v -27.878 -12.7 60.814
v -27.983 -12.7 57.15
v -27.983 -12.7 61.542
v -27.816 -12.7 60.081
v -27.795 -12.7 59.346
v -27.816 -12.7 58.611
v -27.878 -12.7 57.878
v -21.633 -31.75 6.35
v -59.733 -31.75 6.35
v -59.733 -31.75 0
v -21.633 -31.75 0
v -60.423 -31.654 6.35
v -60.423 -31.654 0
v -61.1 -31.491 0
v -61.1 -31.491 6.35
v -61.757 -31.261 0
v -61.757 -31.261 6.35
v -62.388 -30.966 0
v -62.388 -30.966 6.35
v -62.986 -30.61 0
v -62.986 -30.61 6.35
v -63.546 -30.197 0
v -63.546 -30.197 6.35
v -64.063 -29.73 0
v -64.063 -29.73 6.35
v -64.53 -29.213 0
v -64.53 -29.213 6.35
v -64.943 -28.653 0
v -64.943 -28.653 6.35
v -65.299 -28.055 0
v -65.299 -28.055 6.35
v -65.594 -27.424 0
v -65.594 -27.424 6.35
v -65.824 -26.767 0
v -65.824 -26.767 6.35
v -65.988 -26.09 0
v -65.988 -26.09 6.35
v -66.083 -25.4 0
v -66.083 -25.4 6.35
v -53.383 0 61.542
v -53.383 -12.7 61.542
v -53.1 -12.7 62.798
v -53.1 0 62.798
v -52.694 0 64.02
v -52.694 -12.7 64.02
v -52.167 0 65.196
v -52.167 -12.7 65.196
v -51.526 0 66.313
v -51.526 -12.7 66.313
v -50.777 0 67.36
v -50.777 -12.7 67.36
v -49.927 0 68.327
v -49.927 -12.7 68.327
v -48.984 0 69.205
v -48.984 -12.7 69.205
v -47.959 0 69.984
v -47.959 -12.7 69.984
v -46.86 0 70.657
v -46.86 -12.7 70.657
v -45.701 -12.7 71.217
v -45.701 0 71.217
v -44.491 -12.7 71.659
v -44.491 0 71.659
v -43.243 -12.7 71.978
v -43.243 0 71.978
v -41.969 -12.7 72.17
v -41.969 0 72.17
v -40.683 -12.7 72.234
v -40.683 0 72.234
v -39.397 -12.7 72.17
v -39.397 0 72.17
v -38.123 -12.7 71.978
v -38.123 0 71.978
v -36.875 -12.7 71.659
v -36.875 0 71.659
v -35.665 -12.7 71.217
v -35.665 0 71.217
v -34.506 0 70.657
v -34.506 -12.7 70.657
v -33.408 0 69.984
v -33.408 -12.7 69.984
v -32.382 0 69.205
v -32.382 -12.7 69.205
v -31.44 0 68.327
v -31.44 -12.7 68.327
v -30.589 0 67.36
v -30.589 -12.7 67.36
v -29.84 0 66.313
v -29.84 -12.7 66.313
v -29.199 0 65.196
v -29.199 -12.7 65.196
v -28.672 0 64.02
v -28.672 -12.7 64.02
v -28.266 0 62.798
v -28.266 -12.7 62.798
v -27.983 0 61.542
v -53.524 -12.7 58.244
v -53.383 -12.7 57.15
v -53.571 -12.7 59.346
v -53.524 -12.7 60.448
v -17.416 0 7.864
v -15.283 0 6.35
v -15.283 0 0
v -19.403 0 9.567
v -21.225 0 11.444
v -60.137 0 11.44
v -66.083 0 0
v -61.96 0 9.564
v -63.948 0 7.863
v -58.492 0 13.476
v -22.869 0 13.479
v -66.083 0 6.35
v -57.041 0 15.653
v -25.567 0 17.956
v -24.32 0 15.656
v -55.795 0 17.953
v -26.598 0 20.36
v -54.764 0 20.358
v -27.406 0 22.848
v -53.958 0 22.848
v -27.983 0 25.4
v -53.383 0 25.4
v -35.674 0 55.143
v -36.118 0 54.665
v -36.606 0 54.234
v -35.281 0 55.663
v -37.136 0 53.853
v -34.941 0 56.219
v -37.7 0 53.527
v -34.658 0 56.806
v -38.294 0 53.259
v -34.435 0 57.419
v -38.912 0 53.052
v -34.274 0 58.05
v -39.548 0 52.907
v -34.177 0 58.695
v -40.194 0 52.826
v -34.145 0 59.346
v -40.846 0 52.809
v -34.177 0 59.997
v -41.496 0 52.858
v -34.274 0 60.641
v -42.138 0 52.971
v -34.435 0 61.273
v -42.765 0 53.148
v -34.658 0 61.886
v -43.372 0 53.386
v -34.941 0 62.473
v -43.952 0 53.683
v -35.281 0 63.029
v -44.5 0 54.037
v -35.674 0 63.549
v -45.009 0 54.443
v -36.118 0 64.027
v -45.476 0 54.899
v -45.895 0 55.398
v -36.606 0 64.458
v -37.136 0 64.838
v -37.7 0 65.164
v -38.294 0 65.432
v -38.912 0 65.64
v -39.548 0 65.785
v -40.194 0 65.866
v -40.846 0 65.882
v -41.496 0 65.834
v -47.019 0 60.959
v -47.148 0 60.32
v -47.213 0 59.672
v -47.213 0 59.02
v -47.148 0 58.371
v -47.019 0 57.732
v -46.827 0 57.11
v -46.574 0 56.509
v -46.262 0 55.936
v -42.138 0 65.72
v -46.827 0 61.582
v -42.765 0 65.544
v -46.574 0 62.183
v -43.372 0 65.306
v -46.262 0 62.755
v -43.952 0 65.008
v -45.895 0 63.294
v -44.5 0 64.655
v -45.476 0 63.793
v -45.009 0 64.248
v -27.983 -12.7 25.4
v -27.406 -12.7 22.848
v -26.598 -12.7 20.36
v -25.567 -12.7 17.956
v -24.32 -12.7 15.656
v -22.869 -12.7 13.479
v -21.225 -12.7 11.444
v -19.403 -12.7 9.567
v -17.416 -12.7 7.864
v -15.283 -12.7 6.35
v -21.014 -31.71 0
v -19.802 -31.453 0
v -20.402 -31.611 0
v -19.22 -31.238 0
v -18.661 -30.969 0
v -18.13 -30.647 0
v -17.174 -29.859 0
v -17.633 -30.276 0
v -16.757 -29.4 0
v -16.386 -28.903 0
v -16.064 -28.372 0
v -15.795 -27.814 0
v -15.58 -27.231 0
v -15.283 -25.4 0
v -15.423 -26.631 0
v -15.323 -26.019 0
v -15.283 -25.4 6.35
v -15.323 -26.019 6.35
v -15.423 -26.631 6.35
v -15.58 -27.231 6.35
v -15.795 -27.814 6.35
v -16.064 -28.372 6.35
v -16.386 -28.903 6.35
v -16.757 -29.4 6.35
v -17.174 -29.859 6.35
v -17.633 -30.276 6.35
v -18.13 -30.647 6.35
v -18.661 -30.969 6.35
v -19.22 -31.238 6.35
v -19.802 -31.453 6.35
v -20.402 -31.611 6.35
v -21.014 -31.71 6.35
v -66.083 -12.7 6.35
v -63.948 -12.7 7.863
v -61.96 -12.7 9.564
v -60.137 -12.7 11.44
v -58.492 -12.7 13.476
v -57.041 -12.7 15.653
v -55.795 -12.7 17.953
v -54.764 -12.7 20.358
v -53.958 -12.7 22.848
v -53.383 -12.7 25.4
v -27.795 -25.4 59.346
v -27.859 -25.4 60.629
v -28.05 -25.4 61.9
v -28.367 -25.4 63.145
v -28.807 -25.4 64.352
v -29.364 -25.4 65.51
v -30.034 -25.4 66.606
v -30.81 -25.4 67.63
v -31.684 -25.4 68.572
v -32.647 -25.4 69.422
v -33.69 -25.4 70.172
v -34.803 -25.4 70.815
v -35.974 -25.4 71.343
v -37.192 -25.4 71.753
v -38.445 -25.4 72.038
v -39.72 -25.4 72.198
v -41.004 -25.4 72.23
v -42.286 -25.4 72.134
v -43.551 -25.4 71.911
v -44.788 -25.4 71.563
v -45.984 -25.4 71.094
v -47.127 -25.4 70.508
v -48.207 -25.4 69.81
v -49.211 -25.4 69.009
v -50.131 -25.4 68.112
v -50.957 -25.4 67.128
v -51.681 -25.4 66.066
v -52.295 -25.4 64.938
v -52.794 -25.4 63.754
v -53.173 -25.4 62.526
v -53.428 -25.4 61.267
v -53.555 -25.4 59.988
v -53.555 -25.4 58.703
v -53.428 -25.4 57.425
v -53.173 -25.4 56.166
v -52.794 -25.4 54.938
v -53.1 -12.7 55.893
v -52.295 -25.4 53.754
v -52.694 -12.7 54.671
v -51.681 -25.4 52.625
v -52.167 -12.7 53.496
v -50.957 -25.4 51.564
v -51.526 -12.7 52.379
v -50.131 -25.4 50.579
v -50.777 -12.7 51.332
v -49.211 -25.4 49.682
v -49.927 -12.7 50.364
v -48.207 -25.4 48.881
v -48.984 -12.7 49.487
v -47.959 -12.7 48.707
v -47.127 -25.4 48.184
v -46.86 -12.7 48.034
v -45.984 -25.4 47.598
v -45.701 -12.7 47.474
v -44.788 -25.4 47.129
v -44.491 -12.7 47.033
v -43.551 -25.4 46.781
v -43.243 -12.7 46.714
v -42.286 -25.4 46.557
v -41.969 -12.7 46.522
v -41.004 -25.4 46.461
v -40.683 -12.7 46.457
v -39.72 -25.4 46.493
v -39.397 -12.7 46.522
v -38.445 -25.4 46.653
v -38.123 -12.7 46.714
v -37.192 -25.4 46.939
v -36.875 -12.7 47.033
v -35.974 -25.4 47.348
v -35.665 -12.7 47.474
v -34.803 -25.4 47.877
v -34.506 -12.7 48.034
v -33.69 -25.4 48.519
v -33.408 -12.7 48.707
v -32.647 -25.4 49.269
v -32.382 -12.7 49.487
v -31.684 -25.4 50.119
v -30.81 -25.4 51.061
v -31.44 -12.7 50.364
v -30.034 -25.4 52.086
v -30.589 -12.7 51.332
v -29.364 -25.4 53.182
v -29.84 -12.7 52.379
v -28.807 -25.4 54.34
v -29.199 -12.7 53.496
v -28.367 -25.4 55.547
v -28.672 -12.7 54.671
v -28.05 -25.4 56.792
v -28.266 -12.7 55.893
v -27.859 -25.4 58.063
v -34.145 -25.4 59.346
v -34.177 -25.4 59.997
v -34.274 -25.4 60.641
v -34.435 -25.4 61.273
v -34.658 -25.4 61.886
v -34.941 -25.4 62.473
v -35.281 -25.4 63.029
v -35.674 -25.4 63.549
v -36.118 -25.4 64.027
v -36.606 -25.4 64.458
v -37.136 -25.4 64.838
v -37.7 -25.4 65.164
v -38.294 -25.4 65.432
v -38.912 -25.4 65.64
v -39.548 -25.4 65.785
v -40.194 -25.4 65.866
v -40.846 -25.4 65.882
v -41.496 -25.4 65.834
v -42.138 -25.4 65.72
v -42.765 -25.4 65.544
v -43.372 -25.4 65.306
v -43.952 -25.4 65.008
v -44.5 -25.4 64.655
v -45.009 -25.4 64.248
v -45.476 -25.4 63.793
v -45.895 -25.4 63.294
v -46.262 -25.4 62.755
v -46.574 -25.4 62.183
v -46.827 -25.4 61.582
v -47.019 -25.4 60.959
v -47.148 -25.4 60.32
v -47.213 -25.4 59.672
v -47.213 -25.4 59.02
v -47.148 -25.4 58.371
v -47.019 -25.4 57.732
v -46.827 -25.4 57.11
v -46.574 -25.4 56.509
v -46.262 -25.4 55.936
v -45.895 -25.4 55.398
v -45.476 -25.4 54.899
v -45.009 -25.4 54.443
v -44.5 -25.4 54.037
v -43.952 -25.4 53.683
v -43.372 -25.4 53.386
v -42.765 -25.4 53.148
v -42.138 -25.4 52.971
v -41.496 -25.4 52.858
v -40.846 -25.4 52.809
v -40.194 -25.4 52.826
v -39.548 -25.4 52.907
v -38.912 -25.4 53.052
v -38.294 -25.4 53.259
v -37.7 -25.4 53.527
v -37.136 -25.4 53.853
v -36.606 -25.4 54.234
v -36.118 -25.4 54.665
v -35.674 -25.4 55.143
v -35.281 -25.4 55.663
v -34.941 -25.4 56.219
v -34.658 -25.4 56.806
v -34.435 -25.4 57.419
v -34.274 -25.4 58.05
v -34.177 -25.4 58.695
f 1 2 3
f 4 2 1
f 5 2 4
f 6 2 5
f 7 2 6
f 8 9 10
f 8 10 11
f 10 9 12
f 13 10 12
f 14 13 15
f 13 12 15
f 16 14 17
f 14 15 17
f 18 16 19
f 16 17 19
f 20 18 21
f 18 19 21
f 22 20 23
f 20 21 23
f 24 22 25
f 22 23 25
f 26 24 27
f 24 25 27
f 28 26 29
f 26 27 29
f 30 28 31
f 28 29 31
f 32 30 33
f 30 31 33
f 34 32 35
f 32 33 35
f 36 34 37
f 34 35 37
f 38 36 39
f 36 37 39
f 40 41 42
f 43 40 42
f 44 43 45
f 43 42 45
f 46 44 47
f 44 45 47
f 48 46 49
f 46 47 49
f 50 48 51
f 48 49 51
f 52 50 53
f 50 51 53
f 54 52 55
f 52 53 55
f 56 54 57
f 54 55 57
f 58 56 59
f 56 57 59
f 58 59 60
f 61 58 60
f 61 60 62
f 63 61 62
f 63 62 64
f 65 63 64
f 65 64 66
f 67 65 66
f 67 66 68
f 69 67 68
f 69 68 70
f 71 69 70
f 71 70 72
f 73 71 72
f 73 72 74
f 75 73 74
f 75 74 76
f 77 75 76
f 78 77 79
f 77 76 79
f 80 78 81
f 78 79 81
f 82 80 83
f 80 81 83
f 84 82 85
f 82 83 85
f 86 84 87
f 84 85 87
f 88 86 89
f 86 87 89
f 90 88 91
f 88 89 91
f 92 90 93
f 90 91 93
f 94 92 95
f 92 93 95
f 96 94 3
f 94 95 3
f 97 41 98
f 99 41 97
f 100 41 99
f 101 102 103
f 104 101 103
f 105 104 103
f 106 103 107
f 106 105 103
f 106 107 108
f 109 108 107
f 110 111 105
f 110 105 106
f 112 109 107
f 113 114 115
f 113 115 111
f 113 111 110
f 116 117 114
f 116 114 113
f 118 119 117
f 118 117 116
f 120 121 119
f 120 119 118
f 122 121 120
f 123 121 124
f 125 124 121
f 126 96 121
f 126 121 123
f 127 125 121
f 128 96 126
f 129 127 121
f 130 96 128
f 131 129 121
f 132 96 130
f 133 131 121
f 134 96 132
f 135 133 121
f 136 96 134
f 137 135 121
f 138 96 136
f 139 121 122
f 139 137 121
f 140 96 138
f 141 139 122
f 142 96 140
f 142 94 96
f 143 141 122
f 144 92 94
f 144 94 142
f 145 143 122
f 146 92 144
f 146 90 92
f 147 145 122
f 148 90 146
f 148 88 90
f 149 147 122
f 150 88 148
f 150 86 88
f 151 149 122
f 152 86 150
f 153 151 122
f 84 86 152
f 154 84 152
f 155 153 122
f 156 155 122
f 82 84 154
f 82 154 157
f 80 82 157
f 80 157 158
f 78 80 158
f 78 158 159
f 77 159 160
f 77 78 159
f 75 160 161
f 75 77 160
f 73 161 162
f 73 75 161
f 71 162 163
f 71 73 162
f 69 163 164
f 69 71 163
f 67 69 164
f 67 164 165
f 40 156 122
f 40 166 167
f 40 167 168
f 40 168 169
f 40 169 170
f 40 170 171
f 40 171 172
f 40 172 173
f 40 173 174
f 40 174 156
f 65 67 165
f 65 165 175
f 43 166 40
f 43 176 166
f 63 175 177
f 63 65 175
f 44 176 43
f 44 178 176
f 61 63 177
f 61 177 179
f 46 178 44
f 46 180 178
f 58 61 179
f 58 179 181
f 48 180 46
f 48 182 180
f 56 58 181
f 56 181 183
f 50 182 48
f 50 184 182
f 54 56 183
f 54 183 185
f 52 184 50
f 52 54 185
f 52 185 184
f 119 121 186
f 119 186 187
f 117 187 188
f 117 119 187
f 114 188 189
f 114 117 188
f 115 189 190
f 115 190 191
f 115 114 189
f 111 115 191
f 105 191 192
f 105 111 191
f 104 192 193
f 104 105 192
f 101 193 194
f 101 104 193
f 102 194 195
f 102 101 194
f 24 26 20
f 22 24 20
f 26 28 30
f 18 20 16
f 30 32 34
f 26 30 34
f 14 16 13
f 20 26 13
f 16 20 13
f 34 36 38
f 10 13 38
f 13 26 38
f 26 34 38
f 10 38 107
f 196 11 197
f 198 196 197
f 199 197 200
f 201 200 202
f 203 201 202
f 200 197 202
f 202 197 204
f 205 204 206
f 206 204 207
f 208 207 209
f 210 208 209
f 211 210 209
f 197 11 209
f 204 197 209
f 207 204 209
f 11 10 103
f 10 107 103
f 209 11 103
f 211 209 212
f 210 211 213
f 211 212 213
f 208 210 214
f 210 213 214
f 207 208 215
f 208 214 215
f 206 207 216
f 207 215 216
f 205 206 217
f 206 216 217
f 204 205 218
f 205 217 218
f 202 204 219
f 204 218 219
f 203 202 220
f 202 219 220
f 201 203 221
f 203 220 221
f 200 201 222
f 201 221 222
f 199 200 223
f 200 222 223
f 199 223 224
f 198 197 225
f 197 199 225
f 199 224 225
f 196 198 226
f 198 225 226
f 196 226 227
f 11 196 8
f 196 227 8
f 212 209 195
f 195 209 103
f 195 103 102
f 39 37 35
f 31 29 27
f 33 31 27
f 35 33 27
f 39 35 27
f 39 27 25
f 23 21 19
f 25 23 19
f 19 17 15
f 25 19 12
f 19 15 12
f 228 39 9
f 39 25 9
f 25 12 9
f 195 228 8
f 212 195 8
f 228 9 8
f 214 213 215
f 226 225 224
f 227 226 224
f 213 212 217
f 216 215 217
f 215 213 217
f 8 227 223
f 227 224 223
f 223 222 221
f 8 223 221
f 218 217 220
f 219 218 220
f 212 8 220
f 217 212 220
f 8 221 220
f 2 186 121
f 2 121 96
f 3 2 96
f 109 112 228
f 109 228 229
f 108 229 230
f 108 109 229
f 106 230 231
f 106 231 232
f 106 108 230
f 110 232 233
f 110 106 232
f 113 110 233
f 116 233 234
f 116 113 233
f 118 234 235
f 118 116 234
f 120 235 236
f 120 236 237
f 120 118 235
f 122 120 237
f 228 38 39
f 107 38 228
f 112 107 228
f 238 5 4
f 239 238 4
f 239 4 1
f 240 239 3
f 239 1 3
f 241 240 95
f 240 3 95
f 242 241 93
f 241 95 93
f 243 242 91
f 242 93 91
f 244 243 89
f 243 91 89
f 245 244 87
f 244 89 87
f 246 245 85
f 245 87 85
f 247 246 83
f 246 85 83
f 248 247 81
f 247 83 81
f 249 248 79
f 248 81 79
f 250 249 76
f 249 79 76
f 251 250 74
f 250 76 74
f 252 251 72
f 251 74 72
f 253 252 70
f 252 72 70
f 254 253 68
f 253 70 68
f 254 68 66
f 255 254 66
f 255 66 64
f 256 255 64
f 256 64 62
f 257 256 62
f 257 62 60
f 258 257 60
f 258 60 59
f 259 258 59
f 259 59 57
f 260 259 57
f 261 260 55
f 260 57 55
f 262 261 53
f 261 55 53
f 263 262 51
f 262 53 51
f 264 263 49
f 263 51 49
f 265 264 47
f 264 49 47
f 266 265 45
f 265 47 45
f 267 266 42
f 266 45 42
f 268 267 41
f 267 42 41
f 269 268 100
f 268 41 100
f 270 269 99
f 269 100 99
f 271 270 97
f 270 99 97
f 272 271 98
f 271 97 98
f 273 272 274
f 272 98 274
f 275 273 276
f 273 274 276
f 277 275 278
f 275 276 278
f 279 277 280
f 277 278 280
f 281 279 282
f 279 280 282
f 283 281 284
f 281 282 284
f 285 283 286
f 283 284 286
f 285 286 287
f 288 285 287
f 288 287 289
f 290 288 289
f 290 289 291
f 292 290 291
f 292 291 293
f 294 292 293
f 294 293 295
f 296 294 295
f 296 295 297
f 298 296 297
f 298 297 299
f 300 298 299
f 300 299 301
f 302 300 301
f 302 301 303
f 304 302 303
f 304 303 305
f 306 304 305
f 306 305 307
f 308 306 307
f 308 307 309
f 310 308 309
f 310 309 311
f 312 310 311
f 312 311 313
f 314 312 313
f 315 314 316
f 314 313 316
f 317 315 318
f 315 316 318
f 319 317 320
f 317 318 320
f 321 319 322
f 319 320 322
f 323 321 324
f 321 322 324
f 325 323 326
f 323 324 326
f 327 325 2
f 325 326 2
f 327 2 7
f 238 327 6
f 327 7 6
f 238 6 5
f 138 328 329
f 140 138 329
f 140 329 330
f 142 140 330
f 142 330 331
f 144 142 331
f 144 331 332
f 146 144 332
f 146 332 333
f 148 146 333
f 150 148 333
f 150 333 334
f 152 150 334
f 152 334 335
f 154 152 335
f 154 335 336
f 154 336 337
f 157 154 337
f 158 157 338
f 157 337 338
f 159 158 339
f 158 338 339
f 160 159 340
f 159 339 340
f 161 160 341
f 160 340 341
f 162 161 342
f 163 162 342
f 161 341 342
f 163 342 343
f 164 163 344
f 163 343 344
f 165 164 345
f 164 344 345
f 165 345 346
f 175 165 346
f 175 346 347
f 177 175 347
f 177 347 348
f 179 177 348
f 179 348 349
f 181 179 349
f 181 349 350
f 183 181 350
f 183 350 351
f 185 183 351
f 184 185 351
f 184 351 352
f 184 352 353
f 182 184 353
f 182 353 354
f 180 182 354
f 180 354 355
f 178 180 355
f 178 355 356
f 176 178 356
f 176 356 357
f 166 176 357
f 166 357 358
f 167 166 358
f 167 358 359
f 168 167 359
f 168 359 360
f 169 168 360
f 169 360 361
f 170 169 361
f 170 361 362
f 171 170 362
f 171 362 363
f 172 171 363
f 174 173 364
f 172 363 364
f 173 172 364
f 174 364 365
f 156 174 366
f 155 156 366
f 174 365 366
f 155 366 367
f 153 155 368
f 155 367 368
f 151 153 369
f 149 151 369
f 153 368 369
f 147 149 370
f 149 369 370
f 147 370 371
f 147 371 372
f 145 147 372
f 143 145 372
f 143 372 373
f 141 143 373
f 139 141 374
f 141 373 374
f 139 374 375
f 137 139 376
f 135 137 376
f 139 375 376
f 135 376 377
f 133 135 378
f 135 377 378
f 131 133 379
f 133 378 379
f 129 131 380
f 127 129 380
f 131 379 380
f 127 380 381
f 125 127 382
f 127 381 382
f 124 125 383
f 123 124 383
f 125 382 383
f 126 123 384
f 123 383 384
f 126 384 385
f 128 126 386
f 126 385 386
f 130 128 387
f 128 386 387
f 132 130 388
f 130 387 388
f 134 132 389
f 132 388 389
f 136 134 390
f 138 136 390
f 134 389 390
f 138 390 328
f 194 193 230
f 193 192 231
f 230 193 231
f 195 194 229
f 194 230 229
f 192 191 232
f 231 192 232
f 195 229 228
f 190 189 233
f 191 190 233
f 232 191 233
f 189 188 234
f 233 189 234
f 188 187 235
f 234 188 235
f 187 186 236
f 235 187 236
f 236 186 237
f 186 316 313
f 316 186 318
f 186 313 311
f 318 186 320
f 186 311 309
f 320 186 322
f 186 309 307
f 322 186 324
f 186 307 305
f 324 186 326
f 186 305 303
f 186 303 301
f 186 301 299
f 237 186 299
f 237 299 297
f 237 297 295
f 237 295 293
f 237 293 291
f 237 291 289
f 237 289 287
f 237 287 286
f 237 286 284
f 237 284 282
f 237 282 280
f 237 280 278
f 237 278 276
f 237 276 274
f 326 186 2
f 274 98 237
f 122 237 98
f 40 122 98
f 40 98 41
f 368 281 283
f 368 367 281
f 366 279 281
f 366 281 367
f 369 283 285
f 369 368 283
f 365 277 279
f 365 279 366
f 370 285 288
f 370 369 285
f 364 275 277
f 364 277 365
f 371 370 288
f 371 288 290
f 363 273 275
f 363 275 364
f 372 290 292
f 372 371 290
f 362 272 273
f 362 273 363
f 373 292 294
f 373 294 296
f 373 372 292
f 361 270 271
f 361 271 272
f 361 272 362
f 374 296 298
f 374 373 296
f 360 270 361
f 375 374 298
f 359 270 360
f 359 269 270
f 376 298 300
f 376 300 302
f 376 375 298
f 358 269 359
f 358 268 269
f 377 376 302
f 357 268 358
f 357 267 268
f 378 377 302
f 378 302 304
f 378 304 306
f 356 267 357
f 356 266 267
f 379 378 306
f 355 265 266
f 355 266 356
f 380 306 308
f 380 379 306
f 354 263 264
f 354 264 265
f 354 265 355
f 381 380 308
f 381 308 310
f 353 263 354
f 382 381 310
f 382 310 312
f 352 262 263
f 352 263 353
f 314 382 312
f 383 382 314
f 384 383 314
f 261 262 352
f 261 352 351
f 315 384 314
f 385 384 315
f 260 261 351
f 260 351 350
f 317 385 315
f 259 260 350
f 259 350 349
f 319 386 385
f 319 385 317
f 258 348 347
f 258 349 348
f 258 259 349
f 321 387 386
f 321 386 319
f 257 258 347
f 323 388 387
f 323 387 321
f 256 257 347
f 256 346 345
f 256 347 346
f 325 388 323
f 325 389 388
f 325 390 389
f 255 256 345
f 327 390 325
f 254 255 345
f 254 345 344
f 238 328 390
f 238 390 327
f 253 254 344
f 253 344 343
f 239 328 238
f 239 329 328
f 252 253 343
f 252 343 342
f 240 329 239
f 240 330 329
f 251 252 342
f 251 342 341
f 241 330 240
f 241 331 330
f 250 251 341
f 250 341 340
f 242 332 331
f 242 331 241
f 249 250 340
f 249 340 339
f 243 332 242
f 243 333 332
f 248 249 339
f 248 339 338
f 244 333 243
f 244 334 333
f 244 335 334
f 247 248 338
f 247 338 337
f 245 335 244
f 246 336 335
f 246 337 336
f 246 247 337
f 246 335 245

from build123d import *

# Parameters (mm, degrees)
F0_W      = 50.8
F0_H      = 6.35
F1_DEPTH  = 31.75
F2_W      = 50.8
F2_H      = 69.85
F3_DEPTH  = 12.7
F4_W      = 12.7
F4_H      = 69.85
F5_DEPTH  = 25.4
F7_DEPTH  = 12.7
F9_DEPTH  = 12.701
F10_R     = 12.888436
F11_DEPTH = 12.7
F12_R     = 6.538436
F13_DEPTH = 25.401
F15_DEPTH = 25.4
F17_DEPTH = 25.4


with BuildPart() as f1:
    # F0 (on Front) → F1 (new body)
    with BuildSketch(Plane.XZ):
        with Locations((-40.683051, 3.175)):
            Rectangle(F0_W, F0_H)
    extrude(amount=F1_DEPTH)

    # F2 (on face) → F3 (join)
    with BuildSketch(Plane(origin=(0, 0, 0), x_dir=(-1, 0, 0), z_dir=(0, 1, 0))):
        with Locations((40.683051, 41.275)):
            Rectangle(F2_W, F2_H)
    extrude(amount=-F3_DEPTH)

    # F4 (on face) → F5 (cut)
    with BuildSketch(Plane.XZ.offset(12.7)):
        with Locations((-59.733051, 41.275)):
            Rectangle(F4_W, F4_H)
        with Locations((-21.633051, 41.275)):
            Rectangle(F4_W, F4_H)
    extrude(amount=-F5_DEPTH, mode=Mode.SUBTRACT)

    # F6 (on face) → F7 (join)
    with BuildSketch(Plane(origin=(0, 0, 0), x_dir=(-1, 0, 0), z_dir=(0, 1, 0))):
        with BuildLine():
            ThreePointArc((27.983051, 25.4), (23.619413, 14.550759), (15.283051, 6.35))
            Line((15.283051, 6.35), (27.983051, 6.35))
            Line((27.983051, 6.35), (27.983051, 25.4))
        make_face()
        with BuildLine():
            Line((53.383051, 6.35), (66.083051, 6.35))
            ThreePointArc((66.083051, 6.35), (57.741785, 14.547489), (53.383051, 25.4))
            Line((53.383051, 25.4), (53.383051, 6.35))
        make_face()
    extrude(amount=-F7_DEPTH)

    # F8 (on face) → F9 (cut, through all)
    with BuildSketch(Plane.XZ.offset(12.7)):
        with BuildLine():
            ThreePointArc((-53.383051, 61.541711), (-40.683051, 72.234292), (-27.983051, 61.541711))
            Line((-27.983051, 61.541711), (-27.983051, 76.2))
            Line((-27.983051, 76.2), (-53.383051, 76.2))
            Line((-53.383051, 76.2), (-53.383051, 61.541711))
        make_face()
    extrude(amount=-F9_DEPTH, mode=Mode.SUBTRACT)

    # F10 (on face) → F11 (join)
    with BuildSketch(Plane.XZ.offset(12.7)):
        with Locations((-40.683051, 59.345856)):
            Circle(F10_R)
    extrude(amount=F11_DEPTH)

    # F12 (on face) → F13 (cut, through all)
    with BuildSketch(Plane.XZ.offset(25.4)):
        with Locations((-40.683051, 59.345856)):
            Circle(F12_R)
    extrude(amount=-F13_DEPTH, mode=Mode.SUBTRACT)

    # F14 (on face) → F15 (cut)
    with BuildSketch(Plane.XY.offset(6.35)):
        with BuildLine():
            ThreePointArc((-15.283051, -25.4), (-17.173864, -29.859187), (-21.633051, -31.75))
            Line((-21.633051, -31.75), (-15.283051, -31.75))
            Line((-15.283051, -31.75), (-15.283051, -25.4))
        make_face()
    extrude(amount=-F15_DEPTH, mode=Mode.SUBTRACT)

    # F16 (on face) → F17 (cut)
    with BuildSketch(Plane.XY.offset(6.35)):
        with BuildLine():
            ThreePointArc((-59.733051, -31.75), (-64.062729, -29.729678), (-66.083051, -25.4))
            Line((-66.083051, -25.4), (-66.083051, -31.75))
            Line((-66.083051, -31.75), (-59.733051, -31.75))
        make_face()
    extrude(amount=-F17_DEPTH, mode=Mode.SUBTRACT)


solid = f1.part
